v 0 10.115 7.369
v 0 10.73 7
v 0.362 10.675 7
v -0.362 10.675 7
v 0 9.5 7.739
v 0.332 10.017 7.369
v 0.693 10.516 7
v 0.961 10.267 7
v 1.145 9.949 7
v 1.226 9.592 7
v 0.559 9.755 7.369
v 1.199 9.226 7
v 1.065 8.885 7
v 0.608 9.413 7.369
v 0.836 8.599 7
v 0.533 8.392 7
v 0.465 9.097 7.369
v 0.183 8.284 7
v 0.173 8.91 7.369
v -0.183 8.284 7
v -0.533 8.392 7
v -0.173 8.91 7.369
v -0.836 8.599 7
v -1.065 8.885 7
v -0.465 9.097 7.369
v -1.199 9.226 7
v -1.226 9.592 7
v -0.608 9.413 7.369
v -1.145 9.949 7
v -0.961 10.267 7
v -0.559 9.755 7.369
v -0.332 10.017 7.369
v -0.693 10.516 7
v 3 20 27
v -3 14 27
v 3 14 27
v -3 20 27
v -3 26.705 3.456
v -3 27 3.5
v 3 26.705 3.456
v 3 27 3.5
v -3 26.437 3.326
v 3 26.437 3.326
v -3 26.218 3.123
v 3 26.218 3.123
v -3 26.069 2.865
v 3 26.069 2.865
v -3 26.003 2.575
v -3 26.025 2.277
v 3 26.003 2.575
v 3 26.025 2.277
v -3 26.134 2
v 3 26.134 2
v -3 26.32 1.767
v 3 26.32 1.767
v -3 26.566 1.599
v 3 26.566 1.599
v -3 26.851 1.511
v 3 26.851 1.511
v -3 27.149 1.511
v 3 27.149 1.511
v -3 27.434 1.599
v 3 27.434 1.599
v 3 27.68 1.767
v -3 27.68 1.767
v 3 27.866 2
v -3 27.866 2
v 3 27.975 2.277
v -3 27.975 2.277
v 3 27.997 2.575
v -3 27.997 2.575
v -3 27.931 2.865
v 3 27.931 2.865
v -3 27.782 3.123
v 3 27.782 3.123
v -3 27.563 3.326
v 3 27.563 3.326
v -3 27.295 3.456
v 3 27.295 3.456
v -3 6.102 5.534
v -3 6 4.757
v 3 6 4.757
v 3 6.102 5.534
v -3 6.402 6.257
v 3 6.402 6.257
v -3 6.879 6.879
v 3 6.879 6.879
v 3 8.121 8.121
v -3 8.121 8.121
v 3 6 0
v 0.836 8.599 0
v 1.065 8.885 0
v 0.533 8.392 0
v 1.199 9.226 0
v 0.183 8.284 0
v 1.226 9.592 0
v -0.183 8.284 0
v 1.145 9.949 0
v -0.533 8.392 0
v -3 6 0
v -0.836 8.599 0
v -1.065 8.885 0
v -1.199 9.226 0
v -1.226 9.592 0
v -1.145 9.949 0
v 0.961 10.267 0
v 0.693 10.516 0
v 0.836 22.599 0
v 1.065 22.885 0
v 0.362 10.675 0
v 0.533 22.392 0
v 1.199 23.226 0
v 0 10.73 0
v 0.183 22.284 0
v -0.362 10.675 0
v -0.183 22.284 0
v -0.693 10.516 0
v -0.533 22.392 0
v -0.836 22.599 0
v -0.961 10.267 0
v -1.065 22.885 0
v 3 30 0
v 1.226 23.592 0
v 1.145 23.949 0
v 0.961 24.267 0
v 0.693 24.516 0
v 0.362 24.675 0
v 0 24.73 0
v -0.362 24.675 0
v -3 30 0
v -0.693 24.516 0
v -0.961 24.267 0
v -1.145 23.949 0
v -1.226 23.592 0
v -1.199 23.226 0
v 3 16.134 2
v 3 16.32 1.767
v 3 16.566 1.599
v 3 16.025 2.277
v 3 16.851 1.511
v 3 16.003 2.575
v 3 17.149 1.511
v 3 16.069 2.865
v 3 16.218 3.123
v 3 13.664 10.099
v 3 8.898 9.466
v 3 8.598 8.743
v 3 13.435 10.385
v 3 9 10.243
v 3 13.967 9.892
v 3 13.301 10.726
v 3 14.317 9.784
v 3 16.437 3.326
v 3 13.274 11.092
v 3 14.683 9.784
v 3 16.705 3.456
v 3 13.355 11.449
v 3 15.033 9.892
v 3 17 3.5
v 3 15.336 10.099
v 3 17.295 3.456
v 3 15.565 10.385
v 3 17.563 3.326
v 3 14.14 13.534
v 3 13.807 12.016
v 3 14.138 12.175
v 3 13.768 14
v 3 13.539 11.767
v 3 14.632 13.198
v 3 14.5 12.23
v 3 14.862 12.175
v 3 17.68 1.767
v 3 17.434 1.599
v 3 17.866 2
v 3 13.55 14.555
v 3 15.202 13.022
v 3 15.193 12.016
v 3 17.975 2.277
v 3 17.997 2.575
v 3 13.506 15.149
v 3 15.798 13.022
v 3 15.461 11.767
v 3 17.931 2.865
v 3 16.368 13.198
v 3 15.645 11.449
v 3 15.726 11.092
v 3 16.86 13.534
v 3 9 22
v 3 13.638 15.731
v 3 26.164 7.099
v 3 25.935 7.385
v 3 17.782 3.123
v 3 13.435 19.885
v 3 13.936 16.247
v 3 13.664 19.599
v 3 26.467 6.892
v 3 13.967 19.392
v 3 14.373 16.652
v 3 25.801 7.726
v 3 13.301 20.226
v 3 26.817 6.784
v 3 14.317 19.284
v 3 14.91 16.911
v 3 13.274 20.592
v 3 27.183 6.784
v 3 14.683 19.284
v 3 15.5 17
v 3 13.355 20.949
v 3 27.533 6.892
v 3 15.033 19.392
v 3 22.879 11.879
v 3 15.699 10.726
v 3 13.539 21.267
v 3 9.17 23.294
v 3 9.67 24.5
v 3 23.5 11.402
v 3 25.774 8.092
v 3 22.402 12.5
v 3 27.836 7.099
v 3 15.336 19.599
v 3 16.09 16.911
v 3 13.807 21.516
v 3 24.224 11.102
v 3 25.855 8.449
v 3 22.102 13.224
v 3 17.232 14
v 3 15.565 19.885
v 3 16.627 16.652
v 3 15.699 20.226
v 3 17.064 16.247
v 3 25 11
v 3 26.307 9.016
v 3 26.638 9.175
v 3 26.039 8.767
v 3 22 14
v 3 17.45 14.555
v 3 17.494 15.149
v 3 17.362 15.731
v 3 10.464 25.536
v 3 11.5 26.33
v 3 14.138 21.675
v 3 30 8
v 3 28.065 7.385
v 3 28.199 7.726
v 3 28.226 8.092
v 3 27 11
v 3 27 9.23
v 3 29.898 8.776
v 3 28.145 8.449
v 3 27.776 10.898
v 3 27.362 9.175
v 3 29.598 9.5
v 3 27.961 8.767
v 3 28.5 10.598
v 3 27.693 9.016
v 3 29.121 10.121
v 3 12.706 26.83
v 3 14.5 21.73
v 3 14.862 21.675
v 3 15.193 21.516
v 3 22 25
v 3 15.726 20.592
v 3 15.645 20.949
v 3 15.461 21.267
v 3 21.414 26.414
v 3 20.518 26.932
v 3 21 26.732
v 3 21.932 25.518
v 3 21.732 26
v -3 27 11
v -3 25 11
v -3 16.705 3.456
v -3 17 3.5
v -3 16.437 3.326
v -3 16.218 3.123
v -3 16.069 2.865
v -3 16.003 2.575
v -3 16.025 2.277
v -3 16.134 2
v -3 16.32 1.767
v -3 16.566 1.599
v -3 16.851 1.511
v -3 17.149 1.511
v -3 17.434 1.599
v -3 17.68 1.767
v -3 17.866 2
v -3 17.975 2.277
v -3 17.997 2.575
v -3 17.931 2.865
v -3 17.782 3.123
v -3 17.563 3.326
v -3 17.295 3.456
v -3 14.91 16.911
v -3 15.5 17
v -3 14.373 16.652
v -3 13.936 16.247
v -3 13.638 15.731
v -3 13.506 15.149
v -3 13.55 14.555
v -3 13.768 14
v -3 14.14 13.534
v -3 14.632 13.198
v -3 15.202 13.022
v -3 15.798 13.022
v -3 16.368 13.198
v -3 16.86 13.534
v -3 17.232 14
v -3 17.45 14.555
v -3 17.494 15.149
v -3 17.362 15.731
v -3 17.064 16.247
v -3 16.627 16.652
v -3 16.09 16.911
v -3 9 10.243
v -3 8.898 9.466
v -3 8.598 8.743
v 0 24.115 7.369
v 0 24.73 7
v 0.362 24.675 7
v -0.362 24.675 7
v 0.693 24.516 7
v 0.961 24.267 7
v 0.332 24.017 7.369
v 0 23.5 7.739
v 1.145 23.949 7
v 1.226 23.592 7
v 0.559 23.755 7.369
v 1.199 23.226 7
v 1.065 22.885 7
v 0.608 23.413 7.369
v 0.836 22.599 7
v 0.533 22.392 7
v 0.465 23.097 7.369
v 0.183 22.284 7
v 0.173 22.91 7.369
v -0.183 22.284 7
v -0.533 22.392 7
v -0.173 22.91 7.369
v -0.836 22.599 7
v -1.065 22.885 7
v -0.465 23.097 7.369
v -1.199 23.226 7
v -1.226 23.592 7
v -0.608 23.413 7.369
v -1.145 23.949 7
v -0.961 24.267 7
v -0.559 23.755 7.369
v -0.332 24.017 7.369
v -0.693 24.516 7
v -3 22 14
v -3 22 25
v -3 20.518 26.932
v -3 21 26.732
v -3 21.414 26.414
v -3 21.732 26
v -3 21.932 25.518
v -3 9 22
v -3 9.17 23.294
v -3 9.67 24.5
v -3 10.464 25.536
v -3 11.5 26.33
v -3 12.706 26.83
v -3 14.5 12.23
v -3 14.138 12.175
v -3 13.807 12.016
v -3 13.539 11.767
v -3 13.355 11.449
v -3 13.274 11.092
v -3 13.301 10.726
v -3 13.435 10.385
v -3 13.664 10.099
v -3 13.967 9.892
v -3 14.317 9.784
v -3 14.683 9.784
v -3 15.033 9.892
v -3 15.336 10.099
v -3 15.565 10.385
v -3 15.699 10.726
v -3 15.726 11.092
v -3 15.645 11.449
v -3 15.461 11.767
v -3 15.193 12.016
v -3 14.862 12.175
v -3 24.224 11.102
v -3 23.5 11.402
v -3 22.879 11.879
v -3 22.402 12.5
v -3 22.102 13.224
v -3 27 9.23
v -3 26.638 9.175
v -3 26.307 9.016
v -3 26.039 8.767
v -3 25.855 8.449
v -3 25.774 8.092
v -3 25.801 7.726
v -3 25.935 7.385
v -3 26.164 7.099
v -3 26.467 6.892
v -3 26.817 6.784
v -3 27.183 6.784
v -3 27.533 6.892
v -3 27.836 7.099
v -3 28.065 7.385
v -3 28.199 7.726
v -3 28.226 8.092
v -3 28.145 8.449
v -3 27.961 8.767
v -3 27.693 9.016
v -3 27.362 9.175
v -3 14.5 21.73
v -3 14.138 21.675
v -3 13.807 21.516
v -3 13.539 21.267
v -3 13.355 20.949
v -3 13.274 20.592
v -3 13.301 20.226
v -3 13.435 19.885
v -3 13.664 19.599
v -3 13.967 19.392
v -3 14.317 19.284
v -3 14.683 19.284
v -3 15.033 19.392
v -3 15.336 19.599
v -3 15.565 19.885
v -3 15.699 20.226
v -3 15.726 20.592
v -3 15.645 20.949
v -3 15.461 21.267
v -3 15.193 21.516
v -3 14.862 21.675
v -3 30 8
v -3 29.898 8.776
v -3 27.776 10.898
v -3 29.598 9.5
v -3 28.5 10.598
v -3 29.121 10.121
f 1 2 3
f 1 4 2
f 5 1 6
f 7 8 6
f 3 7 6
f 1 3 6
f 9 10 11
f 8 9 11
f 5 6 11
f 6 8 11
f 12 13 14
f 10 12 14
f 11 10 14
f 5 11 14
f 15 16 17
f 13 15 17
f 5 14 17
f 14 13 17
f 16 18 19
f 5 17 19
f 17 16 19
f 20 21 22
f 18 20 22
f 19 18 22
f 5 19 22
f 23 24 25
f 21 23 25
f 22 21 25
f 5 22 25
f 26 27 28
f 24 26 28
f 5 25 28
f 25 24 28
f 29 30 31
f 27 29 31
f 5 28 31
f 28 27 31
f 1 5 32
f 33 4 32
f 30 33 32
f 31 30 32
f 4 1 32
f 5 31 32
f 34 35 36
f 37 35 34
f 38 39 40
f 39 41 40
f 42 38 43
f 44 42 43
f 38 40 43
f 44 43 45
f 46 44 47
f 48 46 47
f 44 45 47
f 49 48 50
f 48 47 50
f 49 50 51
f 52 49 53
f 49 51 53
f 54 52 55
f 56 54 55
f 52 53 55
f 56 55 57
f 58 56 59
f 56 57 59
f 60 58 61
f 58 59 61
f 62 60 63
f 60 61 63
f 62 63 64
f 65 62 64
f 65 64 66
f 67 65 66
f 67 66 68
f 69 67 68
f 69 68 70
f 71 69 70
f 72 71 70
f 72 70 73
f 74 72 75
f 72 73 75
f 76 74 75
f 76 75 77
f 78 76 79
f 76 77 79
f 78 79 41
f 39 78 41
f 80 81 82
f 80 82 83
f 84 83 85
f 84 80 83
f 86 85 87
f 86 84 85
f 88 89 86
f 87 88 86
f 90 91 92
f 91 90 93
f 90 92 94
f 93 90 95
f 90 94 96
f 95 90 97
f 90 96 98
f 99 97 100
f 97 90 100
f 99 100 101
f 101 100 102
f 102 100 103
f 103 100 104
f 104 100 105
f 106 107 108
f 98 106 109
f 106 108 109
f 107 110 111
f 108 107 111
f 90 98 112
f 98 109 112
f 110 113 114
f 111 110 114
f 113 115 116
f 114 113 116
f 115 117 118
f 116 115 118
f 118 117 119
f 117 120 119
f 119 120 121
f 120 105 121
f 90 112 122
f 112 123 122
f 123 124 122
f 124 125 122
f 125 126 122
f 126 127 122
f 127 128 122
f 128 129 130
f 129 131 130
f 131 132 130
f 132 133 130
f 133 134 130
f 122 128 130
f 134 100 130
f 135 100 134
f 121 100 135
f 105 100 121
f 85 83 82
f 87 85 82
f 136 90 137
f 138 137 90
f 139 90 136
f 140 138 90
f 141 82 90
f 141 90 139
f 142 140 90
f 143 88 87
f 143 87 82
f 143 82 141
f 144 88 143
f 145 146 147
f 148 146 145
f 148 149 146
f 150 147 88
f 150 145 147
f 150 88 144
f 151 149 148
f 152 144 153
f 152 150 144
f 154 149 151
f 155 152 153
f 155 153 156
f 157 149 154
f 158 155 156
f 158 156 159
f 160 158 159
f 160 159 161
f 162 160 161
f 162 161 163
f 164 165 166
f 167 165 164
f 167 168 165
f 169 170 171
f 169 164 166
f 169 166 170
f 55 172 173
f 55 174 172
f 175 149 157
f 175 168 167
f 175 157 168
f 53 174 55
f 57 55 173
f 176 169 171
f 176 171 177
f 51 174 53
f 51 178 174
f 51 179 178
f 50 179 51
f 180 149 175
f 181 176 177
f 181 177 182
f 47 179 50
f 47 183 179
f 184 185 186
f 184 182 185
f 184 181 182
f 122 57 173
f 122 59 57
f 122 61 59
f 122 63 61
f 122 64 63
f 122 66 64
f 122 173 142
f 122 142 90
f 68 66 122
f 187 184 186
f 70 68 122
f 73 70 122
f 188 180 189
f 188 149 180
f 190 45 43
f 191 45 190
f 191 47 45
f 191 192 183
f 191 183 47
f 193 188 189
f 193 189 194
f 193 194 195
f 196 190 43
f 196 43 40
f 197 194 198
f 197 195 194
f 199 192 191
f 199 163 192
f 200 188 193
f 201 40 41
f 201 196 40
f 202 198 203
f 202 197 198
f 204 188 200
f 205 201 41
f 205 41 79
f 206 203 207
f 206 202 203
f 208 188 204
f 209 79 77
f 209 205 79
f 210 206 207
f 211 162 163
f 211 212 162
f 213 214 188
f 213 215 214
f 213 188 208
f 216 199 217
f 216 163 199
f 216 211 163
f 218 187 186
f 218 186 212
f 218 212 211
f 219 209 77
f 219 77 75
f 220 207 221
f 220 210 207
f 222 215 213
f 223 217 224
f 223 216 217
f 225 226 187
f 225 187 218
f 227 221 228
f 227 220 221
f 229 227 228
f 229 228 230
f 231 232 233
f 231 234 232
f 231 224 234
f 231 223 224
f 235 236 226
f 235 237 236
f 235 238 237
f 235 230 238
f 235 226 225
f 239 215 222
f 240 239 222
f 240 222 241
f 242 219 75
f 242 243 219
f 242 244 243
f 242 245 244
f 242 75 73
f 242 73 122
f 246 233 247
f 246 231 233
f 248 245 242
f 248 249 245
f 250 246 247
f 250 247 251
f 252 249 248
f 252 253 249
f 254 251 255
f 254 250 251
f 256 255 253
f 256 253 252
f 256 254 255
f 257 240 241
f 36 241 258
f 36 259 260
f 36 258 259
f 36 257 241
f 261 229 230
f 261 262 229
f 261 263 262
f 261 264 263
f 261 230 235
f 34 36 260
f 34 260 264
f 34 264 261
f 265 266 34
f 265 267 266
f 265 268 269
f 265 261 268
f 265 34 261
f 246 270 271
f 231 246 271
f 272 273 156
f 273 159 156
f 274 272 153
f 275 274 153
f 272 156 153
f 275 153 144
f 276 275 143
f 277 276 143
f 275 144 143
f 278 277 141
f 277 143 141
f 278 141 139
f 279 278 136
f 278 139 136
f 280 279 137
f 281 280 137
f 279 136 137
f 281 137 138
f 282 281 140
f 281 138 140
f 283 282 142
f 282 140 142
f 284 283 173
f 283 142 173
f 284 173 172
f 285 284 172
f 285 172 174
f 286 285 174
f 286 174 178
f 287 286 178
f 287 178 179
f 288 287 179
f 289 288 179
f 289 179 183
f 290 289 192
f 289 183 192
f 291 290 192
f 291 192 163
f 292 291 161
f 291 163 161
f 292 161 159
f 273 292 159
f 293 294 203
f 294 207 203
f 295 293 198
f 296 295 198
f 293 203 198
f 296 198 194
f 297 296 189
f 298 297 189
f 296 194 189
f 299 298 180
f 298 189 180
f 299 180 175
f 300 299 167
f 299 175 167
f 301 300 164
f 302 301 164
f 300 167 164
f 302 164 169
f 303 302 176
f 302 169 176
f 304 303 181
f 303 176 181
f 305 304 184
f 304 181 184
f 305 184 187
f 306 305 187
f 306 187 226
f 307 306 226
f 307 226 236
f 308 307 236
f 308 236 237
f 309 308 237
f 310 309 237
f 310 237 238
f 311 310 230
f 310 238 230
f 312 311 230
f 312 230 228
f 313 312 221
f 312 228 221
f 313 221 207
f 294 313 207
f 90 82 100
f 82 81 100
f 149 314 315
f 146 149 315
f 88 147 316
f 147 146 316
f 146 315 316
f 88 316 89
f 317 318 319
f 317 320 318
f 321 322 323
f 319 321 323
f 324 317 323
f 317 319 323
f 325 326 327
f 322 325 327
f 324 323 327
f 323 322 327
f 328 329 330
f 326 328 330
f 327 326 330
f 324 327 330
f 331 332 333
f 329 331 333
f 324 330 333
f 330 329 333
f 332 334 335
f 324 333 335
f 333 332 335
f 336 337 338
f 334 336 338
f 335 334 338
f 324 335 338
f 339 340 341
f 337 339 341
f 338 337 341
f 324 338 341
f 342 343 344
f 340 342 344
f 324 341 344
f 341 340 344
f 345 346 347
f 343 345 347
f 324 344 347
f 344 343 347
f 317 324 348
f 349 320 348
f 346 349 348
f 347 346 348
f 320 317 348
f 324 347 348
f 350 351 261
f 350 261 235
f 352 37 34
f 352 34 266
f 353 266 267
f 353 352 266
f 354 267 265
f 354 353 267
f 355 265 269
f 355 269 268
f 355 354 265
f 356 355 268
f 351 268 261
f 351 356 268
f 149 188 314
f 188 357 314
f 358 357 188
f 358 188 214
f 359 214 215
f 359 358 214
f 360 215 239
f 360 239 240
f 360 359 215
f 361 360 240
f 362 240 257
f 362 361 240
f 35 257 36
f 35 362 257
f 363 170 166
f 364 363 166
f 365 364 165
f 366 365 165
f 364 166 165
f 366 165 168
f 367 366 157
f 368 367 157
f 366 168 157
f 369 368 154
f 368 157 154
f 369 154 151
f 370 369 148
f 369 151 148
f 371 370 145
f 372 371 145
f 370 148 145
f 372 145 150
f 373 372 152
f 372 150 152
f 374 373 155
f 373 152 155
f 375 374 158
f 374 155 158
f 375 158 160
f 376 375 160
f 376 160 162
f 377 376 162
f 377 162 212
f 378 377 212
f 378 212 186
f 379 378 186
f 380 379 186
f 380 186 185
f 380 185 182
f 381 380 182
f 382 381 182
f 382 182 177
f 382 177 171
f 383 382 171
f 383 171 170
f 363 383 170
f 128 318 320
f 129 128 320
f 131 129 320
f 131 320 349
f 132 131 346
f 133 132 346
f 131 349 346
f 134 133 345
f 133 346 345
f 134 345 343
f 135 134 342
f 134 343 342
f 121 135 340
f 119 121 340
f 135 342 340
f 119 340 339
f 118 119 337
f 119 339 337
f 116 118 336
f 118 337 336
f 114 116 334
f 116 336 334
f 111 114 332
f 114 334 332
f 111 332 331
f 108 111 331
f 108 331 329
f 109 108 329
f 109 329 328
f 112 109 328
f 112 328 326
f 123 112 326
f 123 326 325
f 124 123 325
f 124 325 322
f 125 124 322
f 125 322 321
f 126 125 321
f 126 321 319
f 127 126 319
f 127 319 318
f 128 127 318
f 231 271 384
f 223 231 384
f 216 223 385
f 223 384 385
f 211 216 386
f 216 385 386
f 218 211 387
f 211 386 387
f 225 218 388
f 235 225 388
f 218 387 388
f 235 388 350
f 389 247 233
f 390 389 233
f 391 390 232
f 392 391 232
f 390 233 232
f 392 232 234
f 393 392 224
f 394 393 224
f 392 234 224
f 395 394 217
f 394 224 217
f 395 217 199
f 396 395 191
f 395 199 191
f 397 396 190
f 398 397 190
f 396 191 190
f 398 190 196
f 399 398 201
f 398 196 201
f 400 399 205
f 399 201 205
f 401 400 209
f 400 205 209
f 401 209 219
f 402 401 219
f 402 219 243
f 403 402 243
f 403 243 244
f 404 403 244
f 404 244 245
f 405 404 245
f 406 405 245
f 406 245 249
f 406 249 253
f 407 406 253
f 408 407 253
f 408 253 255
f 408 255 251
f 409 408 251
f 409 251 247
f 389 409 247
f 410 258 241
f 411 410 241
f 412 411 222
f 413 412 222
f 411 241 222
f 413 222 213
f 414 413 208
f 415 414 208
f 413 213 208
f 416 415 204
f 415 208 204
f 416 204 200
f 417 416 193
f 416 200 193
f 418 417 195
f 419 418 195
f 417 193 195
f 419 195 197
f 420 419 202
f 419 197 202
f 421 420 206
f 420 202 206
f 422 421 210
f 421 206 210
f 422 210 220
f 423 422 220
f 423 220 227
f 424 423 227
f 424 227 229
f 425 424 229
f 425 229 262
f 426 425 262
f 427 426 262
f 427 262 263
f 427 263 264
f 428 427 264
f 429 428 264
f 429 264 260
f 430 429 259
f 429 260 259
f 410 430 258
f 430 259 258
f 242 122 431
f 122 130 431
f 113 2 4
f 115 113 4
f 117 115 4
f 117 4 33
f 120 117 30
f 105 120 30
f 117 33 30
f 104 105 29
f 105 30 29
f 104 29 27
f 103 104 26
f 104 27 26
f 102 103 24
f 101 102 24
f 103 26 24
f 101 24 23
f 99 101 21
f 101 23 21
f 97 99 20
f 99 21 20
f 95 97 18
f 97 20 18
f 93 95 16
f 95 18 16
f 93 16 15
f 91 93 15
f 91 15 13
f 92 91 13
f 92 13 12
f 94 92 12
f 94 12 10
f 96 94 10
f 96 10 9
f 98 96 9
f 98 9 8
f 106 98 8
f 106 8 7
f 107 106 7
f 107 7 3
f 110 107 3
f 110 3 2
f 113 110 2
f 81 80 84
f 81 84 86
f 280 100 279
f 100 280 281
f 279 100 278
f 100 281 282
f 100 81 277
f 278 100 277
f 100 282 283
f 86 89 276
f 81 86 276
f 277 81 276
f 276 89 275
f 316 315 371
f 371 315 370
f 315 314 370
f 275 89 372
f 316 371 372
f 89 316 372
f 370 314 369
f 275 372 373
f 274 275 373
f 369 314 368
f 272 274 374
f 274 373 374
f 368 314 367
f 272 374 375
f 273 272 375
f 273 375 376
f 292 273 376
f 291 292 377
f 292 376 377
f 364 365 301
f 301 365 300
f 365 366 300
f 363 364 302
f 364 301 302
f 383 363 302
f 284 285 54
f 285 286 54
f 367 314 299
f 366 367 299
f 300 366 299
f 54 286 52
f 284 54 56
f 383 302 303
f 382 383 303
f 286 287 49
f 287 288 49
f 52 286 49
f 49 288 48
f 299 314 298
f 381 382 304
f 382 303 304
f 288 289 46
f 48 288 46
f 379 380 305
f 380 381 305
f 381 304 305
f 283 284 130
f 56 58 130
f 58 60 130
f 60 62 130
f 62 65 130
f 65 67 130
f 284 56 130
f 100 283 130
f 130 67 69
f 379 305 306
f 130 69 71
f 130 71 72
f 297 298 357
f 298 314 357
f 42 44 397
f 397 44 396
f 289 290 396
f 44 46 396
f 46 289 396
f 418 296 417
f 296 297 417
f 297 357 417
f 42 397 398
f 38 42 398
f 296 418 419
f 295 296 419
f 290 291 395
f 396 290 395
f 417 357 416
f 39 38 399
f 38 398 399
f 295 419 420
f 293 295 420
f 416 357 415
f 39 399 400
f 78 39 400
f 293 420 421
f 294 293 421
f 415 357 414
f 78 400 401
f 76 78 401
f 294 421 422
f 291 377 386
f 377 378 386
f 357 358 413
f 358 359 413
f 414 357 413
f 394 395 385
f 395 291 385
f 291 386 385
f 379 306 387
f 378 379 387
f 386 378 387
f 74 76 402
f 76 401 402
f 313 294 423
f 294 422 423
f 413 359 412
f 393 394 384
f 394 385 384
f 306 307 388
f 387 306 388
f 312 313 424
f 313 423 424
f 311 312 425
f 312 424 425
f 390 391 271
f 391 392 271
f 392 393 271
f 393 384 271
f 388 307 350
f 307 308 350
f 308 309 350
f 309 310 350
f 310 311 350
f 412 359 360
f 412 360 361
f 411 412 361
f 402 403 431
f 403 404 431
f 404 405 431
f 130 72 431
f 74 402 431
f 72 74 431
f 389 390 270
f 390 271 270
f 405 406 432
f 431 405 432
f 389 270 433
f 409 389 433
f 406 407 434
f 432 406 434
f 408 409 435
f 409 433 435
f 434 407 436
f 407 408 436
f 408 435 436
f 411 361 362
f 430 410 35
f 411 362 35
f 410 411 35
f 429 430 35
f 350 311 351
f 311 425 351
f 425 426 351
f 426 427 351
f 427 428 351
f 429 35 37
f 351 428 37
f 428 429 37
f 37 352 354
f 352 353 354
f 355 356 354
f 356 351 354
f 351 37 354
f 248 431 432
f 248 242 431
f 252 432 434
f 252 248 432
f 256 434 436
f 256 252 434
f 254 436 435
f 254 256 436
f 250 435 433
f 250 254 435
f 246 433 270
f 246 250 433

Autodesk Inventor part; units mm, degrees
ref_plane "YZ Plane" through (0, 0, 0) normal (1, 0, 0) x (0, 1, 0)
ref_plane "XZ Plane" through (0, 0, 0) normal (0, 1, 0) x (-1, 0, 0)
ref_plane "XY Plane" through (0, 0, 0) normal (0, 0, 1) x (1, 0, 0)
sketch "Skizze1" plane through (0, 0, 0) normal (1, 0, 0) x (0, 1, 0)
  line L0 (6, 0) -> (30, 0)
  line L1 (30, 0) -> (30, 11)
  line L2 (9, 27) -> (9, 9)
  line L3 (9, 27) -> (22, 27)
  line L4 (22, 27) -> (22, 11)
  line L5 (30, 11) -> (22, 11)
  circle A0 centre (15.5, 15) radius 0.5
  circle A1 centre (14.5, 20.5) radius 0.5
  circle A2 centre (27, 8) radius 0.5
  line L6 (0, 32.4) -> (0, -5.4) projected
  line L7 (1.2, 0) -> (34.8, 0) projected
  line L8 (9, 9) -> (6, 6)
  line L9 (6, 6) -> (6, 0)
  circle A3 centre (14.5, 11) radius 0.5
  line L10 (14.5, 20.5) -> (14.5, 11) construction
  dimension "d1" = 11
  dimension "d3" = 27
  dimension "d21" = 1
  dimension "d28" = 1
  dimension "d41" = 1
  dimension "d43" = 8
  dimension "d54" = 9
  dimension "d55" = 27
  dimension "d61" = 15
  dimension "d62" = 15.5
  dimension "d127" = 30
  dimension "d172" = 6
  dimension "d175" = 6
  dimension "d176" = 45
  dimension "d180" = 22
  dimension "d197" = 1
  dimension "d198" = 14.5
  dimension "d199" = 11
  dimension "d201" = 9.5
  dimension "d202" = 0
extrude "Extrusion1" add sketch "Skizze1" along normal mid plane 6
sketch "Skizze9" plane through (-3, 0, 0) normal (-1, 0, 0) x (0, 0, 1)
  circle A0 centre (8, 27) radius 0.5 projected
  point P0 (0, 0)
hole "Feder" at (-3, 27, 8) direction (1, 0, 0) diameter 2.459 end through all thread size "M3x0.5" class "6H" standard "ISO Metric profile"
sketch "Skizze3" plane through (-3, 0, 0) normal (-1, 0, 0) x (0, 0, 1)
  circle A0 centre (20.5, 14.5) radius 0.5 projected
  circle A1 centre (11, 14.5) radius 0.5 projected
hole "Dribbler" at (-3, 14.5, 20.5) at (-3, 14.5, 11) direction (1, 0, 0) diameter 2.459 end through all thread size "M3x0.5" class "6H" standard "ISO Metric profile"
sketch "Skizze4" plane through (-3, 0, 0) normal (-1, 0, 0) x (0, 0, 1)
  circle A0 centre (15, 15.5) radius 0.5 projected
  circle A1 centre (15, 15.5) radius 0.5 projected
  point P0 (0, 0)
hole "Chipper" at (-3, 15.5, 15) direction (1, 0, 0) diameter 4 end through all
sketch "Skizze5" plane through (3, 30, 0) normal (0, 0, -1) x (-1, 0, 0)
  line L0 (6, 0) -> (0, 0) projected
  line L1 (0, -24) -> (0, 0) projected
  line L2 (6, 0) -> (6, -24) projected
  line L3 (3, -24) -> (3, 0) construction
  line L4 (6, -24) -> (0, -24) projected
  line L5 (-1.2, -30) -> (7.2, -30) projected
  point P0 (3, -20.5)
  point P1 (3, -6.5)
  point P2 (3, -13.5)
  point P3 (3, -12)
  dimension "d58" = 7
  dimension "d89" = 7
  dimension "d185" = 9.5
hole "Montage" at (0, 9.5, 0) at (0, 23.5, 0) direction (0, 0, 1) diameter 2.459 depth 7 tip angle 118 thread size "M3x0.5" class "6H" standard "ISO Metric profile"
fillet "Rundung2" radius 3 4 edges at (0, 22, 11) (0, 30, 11) (0, 9, 9) (0, 6, 6)
sketch "Skizze16" plane through (-3, 0, 0) normal (-1, 0, 0) x (0, 0, 1)
  line L0 (2.5, 27) -> (2.5, 17) construction
  line L1 (0, 36) -> (0, -6) construction
  point P0 (0, 0)
  dimension "d161" = 17
  dimension "d162" = 10
  dimension "d177" = 2.5
hole "Bohrung10" at (-3, 27, 2.5) at (-3, 17, 2.5) direction (1, 0, 0) diameter 2 end through all
fillet "Rundung7" radius 5 1 edges at (0, 9, 27)
fillet "Rundung8" radius 2 1 edges at (0, 22, 27)
properties part number "Dribbler Lagerbock v2" material "Aluminium 6061"
